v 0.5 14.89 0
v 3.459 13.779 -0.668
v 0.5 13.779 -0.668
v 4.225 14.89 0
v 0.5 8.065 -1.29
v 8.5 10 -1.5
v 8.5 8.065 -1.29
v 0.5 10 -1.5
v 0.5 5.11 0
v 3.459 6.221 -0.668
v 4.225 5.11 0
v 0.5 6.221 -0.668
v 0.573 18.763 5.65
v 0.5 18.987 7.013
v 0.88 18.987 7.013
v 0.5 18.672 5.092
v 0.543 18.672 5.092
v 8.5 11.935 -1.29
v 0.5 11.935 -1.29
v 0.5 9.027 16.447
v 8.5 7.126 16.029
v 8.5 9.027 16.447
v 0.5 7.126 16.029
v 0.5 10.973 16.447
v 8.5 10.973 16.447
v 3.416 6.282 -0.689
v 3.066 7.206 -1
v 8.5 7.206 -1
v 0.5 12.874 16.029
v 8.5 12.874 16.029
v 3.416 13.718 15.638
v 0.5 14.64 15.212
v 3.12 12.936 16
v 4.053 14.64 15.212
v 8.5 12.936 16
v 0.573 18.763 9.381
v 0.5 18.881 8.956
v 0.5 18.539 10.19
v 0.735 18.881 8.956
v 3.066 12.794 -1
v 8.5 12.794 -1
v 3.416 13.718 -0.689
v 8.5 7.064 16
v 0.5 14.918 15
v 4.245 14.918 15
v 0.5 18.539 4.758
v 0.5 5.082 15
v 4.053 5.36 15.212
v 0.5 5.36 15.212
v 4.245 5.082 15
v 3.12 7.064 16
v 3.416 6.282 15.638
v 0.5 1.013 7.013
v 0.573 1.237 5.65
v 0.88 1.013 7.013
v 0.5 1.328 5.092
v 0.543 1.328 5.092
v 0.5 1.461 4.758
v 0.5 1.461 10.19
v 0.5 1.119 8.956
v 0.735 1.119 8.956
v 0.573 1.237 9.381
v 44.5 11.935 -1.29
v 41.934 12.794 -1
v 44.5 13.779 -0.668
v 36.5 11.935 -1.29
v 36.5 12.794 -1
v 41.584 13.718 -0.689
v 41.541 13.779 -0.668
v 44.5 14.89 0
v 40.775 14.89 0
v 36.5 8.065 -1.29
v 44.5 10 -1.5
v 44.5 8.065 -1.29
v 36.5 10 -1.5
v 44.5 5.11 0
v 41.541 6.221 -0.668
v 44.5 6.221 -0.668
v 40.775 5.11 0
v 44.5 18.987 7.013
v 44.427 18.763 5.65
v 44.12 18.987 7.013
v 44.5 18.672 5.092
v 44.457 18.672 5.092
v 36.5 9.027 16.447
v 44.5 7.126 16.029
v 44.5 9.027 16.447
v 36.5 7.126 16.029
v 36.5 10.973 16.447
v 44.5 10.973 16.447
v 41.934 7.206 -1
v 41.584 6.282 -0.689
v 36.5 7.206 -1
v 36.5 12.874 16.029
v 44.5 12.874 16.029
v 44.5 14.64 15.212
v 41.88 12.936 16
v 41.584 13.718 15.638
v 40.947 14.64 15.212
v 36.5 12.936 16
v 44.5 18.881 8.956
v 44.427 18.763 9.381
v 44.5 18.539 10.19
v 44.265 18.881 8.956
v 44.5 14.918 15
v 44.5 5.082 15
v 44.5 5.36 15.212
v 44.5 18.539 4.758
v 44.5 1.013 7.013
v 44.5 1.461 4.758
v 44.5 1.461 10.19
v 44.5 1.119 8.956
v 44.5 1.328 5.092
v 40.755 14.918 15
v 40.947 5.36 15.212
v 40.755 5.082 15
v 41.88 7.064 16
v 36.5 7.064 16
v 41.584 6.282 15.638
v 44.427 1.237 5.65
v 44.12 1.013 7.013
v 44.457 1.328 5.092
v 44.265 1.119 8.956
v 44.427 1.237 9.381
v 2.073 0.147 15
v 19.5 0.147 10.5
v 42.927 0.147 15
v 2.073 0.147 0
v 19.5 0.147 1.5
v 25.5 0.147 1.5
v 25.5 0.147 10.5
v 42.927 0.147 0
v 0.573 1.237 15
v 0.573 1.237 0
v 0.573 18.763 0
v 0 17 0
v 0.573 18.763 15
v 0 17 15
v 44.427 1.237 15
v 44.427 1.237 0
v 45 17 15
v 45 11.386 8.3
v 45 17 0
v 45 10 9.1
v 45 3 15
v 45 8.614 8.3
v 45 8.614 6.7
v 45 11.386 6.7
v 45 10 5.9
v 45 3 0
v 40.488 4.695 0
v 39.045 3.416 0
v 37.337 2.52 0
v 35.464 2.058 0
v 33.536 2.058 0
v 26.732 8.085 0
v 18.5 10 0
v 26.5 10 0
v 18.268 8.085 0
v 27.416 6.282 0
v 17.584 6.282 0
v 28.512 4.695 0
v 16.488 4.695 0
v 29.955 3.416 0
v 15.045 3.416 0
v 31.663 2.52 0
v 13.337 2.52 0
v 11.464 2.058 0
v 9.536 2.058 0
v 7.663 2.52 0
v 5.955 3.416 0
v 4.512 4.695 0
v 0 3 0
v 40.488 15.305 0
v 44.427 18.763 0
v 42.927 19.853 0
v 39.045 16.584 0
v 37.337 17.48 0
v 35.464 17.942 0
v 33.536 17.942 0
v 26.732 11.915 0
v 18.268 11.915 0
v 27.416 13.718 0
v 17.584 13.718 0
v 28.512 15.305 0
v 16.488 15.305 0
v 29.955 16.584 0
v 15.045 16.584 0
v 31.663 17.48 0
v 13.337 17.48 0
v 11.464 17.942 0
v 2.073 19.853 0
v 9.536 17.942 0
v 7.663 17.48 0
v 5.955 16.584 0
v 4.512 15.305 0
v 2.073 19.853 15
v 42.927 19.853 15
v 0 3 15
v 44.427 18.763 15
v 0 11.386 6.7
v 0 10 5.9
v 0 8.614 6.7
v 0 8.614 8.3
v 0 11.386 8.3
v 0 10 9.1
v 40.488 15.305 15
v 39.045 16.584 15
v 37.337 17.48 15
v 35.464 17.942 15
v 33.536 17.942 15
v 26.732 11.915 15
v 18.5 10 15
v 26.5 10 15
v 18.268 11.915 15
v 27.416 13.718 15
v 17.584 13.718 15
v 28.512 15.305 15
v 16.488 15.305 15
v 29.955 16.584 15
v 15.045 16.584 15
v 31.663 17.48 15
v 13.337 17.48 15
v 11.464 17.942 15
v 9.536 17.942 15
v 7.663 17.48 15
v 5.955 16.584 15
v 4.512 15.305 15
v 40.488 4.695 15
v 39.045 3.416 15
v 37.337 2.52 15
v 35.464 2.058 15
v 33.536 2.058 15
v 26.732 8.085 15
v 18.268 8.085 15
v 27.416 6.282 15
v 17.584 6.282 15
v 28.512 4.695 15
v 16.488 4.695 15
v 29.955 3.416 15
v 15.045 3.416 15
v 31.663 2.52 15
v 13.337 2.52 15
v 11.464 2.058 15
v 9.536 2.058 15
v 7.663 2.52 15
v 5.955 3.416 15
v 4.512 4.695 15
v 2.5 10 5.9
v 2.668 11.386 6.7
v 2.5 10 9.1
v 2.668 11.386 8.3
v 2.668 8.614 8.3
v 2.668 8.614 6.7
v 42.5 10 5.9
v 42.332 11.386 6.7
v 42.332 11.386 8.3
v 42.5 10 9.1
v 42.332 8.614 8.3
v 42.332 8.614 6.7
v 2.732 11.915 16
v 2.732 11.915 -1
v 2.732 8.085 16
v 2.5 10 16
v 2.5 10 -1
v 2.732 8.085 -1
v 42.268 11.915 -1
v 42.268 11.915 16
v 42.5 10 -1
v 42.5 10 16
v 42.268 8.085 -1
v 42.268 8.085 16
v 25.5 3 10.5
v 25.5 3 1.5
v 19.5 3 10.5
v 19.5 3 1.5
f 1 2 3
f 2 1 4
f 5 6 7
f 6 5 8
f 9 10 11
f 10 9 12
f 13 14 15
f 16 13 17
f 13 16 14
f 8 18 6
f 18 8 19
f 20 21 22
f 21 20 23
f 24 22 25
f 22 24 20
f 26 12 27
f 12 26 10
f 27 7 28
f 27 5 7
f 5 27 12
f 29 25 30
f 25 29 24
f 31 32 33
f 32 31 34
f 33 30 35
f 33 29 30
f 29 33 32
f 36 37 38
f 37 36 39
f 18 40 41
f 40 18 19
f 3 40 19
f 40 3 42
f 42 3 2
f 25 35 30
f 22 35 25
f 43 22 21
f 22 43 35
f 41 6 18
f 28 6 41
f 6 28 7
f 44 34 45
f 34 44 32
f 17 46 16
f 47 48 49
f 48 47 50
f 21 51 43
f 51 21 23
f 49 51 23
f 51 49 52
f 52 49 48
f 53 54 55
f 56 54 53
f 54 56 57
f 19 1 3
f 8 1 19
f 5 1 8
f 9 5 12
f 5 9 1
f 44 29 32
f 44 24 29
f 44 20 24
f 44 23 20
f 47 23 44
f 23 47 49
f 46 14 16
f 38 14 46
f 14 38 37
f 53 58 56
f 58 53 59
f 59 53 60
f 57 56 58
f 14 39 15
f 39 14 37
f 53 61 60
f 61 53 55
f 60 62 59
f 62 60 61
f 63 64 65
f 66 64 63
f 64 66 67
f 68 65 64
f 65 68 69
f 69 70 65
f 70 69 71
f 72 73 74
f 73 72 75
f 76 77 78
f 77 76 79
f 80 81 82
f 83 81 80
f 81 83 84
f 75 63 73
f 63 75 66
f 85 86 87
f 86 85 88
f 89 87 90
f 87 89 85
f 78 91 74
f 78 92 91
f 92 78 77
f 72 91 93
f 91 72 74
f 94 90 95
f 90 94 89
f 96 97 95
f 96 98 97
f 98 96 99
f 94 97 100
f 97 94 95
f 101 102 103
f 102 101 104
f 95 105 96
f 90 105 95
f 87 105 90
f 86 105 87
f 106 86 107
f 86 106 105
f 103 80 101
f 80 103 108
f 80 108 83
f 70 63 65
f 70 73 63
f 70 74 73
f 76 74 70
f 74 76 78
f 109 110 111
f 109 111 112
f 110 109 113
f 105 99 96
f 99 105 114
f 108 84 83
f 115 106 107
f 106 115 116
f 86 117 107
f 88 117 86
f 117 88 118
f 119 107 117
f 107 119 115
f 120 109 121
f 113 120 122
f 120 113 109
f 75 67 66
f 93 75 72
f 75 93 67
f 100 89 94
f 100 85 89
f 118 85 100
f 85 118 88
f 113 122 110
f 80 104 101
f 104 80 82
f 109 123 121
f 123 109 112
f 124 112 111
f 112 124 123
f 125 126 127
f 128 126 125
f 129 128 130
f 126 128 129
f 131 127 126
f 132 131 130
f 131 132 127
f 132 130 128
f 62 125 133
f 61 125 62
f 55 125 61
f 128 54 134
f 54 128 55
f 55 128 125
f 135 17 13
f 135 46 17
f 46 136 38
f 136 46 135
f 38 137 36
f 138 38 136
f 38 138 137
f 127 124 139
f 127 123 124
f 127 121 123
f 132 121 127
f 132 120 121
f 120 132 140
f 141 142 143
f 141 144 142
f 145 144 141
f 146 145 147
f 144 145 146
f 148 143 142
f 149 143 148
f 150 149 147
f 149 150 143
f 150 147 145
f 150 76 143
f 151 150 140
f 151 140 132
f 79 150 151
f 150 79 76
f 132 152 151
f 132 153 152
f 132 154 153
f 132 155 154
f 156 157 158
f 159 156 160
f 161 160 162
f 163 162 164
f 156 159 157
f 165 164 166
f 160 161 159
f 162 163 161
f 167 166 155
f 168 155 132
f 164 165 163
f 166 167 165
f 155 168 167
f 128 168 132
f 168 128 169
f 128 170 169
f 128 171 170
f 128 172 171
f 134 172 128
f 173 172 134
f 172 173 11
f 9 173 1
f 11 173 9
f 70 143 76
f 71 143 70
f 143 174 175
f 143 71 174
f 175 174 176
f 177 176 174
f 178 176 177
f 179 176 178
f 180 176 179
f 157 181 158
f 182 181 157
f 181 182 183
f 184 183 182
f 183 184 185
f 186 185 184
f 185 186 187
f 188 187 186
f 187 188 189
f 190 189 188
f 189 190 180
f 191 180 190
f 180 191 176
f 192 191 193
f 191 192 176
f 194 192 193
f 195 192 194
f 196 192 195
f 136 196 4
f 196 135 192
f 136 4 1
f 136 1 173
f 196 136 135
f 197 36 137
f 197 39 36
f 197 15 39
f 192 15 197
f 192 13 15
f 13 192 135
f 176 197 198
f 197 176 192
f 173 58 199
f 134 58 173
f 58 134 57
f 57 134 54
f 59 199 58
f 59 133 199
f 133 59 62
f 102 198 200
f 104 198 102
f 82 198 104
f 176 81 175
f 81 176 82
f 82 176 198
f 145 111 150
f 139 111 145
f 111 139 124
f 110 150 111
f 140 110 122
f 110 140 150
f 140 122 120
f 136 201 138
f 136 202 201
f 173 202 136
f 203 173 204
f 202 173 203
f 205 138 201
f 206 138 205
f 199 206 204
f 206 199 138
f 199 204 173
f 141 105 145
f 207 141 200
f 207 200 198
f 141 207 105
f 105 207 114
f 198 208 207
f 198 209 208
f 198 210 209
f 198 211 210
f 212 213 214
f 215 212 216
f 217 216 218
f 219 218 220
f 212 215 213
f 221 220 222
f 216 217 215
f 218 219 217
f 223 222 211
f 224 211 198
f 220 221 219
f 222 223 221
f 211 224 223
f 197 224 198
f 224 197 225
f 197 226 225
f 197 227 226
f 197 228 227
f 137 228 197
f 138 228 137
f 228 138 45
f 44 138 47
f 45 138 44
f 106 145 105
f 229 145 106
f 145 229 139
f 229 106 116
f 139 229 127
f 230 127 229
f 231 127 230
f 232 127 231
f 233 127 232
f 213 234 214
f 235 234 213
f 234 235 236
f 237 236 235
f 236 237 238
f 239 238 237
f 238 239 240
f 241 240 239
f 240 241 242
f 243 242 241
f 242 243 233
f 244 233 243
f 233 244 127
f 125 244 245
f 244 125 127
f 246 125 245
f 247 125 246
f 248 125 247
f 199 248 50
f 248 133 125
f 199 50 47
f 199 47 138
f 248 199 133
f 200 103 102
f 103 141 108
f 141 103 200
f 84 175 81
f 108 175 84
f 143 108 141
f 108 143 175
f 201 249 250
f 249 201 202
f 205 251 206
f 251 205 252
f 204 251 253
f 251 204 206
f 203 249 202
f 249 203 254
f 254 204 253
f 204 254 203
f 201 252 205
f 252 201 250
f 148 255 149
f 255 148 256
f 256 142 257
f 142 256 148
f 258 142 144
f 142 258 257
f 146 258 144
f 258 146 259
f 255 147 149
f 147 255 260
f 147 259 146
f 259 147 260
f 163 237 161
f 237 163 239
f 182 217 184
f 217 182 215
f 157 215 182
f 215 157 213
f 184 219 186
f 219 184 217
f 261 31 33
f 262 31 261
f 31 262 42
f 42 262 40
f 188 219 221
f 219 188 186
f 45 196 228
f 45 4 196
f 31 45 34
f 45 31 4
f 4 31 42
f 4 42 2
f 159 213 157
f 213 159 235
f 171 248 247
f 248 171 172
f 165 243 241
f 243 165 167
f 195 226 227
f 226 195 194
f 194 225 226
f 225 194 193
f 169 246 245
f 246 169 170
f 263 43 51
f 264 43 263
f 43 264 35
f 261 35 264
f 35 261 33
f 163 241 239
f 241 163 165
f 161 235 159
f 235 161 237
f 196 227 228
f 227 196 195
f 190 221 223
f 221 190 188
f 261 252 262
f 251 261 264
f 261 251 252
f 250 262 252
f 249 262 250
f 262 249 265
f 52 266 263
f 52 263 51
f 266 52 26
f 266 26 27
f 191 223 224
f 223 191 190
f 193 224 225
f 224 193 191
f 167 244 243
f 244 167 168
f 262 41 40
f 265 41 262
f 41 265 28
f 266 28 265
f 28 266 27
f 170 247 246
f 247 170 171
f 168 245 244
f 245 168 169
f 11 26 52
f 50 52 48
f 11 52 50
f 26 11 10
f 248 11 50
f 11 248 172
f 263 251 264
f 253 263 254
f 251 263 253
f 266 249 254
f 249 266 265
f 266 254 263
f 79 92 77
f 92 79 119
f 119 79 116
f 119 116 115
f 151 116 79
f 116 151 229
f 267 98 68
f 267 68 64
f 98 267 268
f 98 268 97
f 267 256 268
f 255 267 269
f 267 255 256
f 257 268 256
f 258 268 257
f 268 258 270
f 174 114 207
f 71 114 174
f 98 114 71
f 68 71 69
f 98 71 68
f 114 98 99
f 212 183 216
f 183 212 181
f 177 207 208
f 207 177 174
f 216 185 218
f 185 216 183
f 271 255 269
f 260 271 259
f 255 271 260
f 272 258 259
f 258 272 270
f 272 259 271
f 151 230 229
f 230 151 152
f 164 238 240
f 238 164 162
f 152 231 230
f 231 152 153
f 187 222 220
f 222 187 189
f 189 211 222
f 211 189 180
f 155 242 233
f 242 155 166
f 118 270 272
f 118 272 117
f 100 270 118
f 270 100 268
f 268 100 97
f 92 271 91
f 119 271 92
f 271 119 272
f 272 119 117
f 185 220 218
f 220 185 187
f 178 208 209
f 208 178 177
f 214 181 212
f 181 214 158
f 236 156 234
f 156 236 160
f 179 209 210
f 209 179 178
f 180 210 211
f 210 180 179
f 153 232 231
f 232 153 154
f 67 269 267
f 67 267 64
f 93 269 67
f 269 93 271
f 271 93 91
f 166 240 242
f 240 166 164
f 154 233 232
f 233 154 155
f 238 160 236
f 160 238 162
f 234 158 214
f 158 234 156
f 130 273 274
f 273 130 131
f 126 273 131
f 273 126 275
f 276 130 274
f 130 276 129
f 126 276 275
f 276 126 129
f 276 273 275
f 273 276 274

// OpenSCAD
// Basic Sensor Mount - Generic HC-SR04 Mounting Bracket
// Reusable mounting solution for ultrasonic proximity sensors

module sensor_basic_mount() {
    width = 45;
    height = 20;
    depth = 15;
    trans_diameter = 16;
    trans_spacing = 24;
    
    difference() {
        // Main bracket body with mounting flanges
        union() {
            // Central body
            hull() {
                for(x = [3, width-3]) {
                    for(y = [3, height-3]) {
                        translate([x, y, 0])
                            cylinder(h=depth, d=6);
                    }
                }
            }
            // Mounting flanges
            for(i = [0:1]) {
                translate([width*0.1 + i*width*0.8, height*0.5, depth*0.5])
                    rotate([0, 90, 0])
                        cylinder(h=8, d=depth*1.2, center=true);
            }
        }
        
        // Sensor transducer holes
        translate([width*0.5 - trans_spacing*0.5, height*0.5, -1])
            cylinder(h=depth+2, d=trans_diameter); // Left transducer
        translate([width*0.5 + trans_spacing*0.5, height*0.5, -1])  
            cylinder(h=depth+2, d=trans_diameter); // Right transducer
            
        // PCB mounting holes
        for(i = [0:1]) {
            for(j = [0:1]) {
                translate([width*0.2 + i*width*0.6, height*0.2 + j*height*0.6, -1])
                    cylinder(h=depth+2, d=2.5);
            }
        }
        
        // Case mounting holes (M3 screws through flanges)
        for(i = [0:1]) {
            translate([width*0.1 + i*width*0.8, height*0.5, depth*0.5])
                rotate([0, 90, 0])
                    cylinder(h=12, d=3.2, center=true);
        }
        
        // Wire management slot
        translate([width*0.5, 0, depth*0.4])
            cube([6, height*0.3, depth*0.6], center=true);
    }
}

// Generate the mount
sensor_basic_mount();
